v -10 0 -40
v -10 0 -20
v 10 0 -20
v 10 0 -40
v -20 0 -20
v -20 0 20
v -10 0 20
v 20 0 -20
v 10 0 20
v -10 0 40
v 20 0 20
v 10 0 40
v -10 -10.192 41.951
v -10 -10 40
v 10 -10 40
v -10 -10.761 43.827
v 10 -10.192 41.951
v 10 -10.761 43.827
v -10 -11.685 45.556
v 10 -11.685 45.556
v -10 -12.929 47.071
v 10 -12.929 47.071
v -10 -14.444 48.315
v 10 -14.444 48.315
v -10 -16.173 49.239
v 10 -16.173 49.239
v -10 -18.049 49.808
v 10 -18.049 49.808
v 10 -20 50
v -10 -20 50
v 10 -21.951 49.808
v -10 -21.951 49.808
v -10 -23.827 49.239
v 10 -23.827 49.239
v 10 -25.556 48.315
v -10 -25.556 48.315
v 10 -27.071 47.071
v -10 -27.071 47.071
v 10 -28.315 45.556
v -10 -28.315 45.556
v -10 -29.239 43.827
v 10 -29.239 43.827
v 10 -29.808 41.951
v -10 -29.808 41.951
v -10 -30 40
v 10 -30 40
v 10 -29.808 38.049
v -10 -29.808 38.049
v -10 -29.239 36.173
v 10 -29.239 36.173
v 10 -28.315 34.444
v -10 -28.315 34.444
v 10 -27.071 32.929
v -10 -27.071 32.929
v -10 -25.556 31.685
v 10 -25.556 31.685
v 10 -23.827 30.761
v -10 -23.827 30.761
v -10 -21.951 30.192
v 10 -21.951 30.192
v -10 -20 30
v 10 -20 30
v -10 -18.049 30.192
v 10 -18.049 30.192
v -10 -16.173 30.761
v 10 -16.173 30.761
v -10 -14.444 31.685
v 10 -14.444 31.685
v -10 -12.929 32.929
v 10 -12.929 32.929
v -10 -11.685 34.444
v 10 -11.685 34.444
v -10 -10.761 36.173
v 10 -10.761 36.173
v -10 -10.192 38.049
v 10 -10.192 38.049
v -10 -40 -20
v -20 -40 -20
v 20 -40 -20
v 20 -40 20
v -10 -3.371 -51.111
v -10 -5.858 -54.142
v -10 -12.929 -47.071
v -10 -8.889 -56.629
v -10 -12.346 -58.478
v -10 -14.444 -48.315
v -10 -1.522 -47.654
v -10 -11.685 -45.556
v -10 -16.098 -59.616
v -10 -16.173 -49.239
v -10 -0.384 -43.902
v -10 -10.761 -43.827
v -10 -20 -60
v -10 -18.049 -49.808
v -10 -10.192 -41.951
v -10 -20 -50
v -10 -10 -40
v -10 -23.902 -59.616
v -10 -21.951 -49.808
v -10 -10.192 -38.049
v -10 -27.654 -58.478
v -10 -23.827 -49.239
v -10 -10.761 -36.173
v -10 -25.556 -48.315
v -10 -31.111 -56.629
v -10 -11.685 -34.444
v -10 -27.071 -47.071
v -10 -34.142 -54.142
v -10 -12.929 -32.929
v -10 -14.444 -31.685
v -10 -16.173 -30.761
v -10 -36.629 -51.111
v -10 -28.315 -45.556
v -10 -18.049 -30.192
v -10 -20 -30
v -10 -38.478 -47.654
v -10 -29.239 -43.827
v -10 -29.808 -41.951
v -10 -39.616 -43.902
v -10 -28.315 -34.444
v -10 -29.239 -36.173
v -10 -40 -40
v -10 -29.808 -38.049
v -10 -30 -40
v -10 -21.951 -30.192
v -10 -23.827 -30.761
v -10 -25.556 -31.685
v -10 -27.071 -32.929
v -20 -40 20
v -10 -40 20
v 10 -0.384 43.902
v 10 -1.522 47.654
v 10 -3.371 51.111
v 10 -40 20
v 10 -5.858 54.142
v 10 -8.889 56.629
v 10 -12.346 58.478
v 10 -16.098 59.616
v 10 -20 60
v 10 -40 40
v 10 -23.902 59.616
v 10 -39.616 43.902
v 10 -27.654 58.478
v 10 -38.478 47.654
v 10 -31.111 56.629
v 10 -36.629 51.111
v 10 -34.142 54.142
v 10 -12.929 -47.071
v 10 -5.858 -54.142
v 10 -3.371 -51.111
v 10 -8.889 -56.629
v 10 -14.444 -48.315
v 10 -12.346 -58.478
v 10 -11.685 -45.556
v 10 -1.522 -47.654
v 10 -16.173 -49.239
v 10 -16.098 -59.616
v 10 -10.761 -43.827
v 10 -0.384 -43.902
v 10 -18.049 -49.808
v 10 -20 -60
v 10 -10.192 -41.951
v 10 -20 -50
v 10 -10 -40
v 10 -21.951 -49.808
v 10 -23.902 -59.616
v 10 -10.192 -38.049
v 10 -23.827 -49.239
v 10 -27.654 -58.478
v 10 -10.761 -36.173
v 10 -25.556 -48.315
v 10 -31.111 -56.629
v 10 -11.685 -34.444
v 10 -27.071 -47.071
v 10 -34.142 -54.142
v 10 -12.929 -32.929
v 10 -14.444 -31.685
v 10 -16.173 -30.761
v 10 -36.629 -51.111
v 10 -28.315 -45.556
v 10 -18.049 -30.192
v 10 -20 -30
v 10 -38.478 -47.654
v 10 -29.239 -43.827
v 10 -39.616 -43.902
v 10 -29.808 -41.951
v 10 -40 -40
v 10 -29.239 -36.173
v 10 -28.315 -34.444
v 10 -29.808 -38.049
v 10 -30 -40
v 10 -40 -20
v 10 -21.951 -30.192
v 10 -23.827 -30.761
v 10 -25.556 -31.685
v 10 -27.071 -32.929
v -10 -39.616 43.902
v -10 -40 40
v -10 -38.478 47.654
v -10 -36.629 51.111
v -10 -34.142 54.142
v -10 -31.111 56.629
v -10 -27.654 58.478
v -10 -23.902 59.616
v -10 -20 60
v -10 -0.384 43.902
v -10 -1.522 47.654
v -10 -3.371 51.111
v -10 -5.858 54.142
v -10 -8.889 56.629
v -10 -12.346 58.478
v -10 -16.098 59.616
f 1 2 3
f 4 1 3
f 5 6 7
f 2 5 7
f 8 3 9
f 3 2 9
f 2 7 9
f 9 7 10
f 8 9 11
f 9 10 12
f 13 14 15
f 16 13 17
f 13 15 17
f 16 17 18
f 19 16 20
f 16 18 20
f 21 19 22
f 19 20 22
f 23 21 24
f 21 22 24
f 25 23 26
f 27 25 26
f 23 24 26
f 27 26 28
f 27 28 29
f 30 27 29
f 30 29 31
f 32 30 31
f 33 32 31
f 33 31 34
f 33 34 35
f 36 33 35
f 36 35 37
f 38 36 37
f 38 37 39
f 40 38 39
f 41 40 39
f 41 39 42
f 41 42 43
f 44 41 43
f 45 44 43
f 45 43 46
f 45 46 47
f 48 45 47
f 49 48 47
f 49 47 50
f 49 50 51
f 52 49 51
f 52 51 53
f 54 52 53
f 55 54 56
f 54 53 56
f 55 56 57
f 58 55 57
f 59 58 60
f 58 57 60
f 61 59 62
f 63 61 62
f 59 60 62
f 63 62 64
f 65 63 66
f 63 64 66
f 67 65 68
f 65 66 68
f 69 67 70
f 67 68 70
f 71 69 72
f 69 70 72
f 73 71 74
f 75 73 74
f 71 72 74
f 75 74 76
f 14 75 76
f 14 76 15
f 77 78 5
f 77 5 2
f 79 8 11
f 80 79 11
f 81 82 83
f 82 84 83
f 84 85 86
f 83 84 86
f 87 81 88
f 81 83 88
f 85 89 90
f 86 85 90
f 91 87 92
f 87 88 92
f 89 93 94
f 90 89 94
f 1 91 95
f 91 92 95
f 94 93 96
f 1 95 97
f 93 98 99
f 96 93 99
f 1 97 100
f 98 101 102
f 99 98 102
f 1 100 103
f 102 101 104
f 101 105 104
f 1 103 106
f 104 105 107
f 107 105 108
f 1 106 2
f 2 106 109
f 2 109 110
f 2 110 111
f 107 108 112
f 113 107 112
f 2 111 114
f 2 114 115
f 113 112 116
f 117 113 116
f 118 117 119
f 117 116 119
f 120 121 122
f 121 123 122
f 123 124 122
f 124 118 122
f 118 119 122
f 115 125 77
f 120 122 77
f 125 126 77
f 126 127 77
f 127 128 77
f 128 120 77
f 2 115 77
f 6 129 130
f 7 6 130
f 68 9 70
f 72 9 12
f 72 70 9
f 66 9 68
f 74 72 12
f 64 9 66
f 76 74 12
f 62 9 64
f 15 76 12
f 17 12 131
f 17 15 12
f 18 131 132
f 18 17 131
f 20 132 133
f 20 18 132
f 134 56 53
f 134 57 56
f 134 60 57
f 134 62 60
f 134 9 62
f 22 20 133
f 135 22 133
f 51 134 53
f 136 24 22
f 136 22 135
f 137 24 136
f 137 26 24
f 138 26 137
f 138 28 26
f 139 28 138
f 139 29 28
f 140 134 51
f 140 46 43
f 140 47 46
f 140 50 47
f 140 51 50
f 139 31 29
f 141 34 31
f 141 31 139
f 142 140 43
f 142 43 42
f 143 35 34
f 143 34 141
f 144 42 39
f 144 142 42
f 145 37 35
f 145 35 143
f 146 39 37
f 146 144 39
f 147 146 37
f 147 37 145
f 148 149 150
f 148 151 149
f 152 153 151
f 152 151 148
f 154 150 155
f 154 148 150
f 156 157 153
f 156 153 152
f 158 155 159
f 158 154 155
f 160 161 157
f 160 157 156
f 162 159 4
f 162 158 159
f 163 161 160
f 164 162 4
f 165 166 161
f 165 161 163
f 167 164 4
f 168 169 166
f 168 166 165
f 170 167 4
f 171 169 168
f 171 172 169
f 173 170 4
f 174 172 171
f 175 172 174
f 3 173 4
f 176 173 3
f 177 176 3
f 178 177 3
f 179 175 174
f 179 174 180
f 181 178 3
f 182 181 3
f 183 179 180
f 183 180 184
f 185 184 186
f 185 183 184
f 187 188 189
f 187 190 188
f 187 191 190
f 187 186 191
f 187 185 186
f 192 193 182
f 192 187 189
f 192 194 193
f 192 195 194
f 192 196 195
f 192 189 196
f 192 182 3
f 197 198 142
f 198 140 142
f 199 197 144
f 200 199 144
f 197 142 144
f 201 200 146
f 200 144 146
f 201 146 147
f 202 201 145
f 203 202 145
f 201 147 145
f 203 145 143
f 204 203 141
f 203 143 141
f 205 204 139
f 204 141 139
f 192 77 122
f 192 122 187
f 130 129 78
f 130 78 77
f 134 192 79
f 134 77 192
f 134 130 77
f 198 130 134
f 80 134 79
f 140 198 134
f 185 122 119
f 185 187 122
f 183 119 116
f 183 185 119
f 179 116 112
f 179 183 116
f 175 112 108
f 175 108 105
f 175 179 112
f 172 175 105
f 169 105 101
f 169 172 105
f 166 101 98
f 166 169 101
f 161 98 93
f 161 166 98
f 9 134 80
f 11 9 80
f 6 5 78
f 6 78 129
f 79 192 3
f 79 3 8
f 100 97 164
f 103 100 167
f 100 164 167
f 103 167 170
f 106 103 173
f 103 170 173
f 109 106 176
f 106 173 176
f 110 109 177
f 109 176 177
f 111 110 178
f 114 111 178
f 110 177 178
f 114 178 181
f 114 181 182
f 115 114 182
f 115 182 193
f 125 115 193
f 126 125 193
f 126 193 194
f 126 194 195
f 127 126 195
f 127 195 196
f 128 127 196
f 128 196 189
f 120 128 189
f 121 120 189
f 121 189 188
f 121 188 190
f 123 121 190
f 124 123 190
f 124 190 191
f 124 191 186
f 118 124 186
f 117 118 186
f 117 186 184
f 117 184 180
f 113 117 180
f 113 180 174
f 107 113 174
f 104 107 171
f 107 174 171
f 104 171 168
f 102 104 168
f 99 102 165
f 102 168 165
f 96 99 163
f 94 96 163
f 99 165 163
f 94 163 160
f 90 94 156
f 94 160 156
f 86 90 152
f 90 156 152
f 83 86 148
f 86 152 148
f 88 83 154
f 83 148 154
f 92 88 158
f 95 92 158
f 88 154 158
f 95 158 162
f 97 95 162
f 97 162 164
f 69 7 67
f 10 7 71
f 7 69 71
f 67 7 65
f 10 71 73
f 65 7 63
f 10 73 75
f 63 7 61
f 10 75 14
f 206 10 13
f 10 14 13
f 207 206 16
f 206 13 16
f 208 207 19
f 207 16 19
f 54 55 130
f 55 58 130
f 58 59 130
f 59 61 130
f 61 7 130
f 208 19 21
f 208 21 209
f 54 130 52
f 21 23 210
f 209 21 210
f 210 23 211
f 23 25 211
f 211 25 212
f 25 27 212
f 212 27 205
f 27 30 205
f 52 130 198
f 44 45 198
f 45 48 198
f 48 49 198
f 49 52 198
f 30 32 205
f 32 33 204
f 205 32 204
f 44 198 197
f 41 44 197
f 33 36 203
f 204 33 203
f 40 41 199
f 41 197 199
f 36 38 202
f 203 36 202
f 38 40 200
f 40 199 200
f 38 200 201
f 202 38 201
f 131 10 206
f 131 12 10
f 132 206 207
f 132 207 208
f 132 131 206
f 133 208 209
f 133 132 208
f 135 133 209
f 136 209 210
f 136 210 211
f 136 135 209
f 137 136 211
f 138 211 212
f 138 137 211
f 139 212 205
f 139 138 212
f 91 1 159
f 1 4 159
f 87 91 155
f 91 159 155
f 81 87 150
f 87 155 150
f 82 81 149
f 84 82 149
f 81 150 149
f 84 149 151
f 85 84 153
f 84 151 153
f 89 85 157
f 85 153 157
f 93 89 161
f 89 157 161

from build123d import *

# Parameters (mm, degrees)
F0_W      = 40
F0_H      = 120
F1_DEPTH  = 40
F2_W      = 10
F2_H      = 40
F3_DEPTH  = 40
F4_W      = 10
F4_H      = 40
F5_DEPTH  = 40
F6_W      = 10
F6_H      = 40
F7_DEPTH  = 40
F8_R      = 10
F9_DEPTH  = 25
F10_R     = 10
F11_DEPTH = 25
F12_R     = 19.99999


# Not quite as in the source:
# - a fillet or chamfer is up to 0.001 mm smaller than in the source, because OpenCascade refuses the exact size


with BuildPart() as f1:
    # F0 (on Front) → F1 (new body)
    with BuildSketch(Plane.XZ):
        Rectangle(F0_W, F0_H)
    extrude(amount=F1_DEPTH)

    # F2 (on face) → F3 (cut)
    with BuildSketch(Plane.XZ.offset(40)):
        with Locations((-15, 40)):
            Rectangle(F2_W, F2_H)
    extrude(amount=-F3_DEPTH, mode=Mode.SUBTRACT)

    # F4 (on face) → F5 (cut)
    with BuildSketch(Plane.XZ.offset(40)):
        with Locations((15, 40)):
            Rectangle(F4_W, F4_H)
    extrude(amount=-F5_DEPTH, mode=Mode.SUBTRACT)

    # F6 (on face) → F7 (cut)
    with BuildSketch(Plane.XZ.offset(40)):
        with Locations((-15, -40)):
            Rectangle(F6_W, F6_H)
        with Locations((15, -40)):
            Rectangle(F6_W, F6_H)
    extrude(amount=-F7_DEPTH, mode=Mode.SUBTRACT)

    # F8 (on face) → F9 (cut)
    with BuildSketch(Plane.YZ.offset(10)):
        with Locations((-20, 40)):
            Circle(F8_R)
    extrude(amount=-F9_DEPTH, mode=Mode.SUBTRACT)

    # F10 (on face) → F11 (cut)
    with BuildSketch(Plane.YZ.offset(10)):
        with Locations((-20, -40)):
            Circle(F10_R)
    extrude(amount=-F11_DEPTH, mode=Mode.SUBTRACT)

    # F12 (radius 20 in the source; OpenCascade refuses exactly that, so slightly less here)
    f12_edges = [f1.edges().sort_by_distance(p)[0] for p in [
        (0, -40, 60),
        (0, 0, 60),
        (0, -40, -60),
        (0, 0, -60),
    ]]
    fillet(f12_edges, radius=F12_R)


solid = f1.part
